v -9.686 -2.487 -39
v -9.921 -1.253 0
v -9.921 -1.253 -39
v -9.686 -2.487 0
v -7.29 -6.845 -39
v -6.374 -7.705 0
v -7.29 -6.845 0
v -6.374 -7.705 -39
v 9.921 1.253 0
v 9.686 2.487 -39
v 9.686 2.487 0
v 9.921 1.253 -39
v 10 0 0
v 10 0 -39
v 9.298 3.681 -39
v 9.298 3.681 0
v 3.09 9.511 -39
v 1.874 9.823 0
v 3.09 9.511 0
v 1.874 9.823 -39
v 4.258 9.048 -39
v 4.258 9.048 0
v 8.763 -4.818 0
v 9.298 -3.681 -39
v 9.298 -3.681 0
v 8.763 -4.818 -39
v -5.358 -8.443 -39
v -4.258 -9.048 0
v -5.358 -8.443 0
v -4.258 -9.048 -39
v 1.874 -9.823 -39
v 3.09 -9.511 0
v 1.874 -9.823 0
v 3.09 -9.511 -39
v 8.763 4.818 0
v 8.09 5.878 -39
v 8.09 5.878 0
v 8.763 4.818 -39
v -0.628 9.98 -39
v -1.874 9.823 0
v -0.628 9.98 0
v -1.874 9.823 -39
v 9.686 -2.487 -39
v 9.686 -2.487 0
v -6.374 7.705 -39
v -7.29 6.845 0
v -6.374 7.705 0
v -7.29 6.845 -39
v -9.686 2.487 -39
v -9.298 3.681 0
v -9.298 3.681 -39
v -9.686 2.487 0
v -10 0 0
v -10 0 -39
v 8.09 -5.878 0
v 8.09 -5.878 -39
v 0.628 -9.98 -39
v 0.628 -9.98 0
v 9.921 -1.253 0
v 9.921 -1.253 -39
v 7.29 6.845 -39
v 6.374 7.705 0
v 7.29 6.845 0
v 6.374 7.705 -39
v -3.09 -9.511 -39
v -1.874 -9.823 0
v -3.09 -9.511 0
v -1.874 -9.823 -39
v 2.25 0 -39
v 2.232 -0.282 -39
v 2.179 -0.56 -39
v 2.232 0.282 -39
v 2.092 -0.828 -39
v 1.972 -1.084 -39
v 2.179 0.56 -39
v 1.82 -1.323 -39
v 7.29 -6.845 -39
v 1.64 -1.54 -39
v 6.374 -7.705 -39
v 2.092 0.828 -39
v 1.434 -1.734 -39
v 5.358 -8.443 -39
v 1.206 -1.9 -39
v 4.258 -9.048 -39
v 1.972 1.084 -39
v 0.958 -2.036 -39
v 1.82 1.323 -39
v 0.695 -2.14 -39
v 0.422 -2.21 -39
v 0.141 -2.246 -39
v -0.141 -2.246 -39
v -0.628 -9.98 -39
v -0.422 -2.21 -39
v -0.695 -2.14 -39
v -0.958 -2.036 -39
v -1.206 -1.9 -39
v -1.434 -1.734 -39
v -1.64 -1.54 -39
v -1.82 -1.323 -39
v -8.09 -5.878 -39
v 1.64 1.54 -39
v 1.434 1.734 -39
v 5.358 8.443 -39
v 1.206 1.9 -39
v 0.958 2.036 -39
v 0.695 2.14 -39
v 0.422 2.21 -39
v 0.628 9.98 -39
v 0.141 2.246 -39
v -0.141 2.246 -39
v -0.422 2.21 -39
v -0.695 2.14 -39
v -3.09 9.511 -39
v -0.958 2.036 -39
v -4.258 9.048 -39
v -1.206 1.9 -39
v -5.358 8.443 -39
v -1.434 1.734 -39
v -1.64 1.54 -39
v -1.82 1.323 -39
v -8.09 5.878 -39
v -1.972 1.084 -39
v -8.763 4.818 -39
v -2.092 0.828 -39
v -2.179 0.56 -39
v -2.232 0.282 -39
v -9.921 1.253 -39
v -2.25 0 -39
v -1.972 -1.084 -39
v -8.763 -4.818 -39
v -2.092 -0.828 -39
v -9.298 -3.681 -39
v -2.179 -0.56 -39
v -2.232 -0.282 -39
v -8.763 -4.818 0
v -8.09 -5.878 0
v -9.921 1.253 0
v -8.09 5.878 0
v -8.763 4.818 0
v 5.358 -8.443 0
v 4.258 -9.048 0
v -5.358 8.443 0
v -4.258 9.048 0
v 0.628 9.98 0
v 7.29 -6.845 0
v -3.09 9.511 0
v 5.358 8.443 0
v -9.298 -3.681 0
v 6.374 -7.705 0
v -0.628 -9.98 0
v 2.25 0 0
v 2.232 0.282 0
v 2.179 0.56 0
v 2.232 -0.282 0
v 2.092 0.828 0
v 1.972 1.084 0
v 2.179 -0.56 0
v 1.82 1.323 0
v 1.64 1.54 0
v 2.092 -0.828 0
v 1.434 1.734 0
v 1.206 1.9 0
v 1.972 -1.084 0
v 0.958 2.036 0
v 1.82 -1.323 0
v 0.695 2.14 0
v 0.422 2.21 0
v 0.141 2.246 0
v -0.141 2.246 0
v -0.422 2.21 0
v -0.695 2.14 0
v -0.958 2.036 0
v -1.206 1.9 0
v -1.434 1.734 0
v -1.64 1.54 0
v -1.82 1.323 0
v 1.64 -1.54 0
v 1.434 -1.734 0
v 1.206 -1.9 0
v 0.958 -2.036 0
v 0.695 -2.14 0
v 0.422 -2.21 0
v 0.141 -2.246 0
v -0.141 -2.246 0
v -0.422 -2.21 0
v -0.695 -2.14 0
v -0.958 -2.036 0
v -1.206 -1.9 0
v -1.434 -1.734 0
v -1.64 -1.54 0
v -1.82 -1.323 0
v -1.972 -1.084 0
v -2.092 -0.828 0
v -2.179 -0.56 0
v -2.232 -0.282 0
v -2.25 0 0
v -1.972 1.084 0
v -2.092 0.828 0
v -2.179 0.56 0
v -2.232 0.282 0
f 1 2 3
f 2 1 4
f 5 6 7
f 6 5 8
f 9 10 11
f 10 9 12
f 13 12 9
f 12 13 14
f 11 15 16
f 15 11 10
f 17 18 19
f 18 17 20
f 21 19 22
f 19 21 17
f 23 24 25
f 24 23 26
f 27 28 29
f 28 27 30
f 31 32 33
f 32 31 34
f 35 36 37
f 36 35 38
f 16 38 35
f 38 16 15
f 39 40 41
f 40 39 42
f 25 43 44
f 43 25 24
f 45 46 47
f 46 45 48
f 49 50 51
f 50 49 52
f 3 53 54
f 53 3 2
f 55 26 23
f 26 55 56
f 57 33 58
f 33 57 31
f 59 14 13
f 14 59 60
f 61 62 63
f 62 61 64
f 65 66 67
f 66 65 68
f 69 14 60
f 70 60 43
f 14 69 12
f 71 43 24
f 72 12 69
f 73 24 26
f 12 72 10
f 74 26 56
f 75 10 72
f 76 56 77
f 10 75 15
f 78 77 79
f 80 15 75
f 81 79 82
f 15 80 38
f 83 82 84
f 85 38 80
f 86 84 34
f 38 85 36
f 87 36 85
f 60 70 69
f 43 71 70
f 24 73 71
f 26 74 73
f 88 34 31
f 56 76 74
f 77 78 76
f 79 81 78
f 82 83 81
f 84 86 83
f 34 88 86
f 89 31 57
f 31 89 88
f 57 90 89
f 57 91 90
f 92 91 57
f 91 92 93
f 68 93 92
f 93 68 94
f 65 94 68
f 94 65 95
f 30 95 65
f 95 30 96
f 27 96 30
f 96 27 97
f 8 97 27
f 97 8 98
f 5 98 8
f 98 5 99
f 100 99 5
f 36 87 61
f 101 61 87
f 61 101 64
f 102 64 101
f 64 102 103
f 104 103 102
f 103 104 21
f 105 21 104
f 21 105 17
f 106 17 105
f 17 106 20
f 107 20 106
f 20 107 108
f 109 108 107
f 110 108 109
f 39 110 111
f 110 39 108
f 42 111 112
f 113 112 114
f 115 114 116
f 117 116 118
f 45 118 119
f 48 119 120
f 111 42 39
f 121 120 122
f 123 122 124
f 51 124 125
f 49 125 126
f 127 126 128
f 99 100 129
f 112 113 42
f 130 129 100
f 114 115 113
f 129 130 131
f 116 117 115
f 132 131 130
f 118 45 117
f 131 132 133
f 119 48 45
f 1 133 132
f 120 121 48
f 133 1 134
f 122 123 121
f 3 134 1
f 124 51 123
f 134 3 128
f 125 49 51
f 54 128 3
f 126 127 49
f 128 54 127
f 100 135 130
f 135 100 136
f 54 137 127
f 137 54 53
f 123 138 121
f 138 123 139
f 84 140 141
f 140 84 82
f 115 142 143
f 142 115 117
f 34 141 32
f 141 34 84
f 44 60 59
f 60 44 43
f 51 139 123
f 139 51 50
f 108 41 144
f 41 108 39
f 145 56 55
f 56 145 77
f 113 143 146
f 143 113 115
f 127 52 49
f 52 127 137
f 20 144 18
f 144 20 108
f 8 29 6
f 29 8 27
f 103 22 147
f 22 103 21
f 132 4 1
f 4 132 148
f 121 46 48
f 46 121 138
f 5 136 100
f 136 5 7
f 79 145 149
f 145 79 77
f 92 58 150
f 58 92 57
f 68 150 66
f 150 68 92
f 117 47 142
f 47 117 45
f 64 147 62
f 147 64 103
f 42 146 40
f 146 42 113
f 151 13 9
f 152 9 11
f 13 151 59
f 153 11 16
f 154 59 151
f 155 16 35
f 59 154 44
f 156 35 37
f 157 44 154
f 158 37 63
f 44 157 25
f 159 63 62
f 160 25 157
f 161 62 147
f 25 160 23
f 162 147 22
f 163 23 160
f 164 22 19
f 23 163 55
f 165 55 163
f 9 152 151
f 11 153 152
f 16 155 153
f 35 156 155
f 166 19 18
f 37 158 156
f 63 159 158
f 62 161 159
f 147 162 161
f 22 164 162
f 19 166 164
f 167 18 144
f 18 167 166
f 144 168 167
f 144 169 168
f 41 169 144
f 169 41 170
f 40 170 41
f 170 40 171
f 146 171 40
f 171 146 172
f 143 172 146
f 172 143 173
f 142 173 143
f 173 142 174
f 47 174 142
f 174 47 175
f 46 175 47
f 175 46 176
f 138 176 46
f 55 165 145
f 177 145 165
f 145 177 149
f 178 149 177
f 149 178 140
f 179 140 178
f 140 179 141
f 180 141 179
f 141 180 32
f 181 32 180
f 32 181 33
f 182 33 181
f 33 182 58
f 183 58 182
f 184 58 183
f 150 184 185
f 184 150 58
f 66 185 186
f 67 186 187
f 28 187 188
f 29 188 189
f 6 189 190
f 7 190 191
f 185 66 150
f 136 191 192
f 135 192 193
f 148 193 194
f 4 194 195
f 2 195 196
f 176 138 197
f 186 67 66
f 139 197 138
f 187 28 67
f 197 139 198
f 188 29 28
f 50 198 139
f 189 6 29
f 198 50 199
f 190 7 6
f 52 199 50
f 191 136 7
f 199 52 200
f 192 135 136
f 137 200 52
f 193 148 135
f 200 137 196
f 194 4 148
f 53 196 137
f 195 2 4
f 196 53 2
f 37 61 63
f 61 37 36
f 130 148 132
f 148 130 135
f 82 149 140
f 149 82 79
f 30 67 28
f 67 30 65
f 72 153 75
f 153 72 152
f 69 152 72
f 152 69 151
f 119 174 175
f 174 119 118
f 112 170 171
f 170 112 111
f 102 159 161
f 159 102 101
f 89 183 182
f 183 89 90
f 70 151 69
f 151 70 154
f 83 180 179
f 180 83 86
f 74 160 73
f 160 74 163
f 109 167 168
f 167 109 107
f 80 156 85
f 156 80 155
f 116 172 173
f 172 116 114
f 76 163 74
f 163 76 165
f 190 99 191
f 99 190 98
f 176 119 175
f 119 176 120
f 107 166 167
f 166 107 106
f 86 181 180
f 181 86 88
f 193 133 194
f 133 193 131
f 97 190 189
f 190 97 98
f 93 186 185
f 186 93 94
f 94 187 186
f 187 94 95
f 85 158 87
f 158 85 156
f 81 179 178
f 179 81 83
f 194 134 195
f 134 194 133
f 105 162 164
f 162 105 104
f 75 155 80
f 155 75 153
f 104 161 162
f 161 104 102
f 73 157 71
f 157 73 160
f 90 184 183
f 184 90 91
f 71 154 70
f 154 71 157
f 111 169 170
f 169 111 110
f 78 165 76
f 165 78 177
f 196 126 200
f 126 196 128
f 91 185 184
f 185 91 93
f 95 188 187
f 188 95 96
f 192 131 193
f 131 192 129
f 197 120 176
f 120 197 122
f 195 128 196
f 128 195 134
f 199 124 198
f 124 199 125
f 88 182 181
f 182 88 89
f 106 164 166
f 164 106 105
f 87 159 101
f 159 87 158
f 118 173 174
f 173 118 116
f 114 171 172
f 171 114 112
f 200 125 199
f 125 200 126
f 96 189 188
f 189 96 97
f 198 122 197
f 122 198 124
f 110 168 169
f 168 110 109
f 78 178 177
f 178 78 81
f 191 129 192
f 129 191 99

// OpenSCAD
$fn = 50;


difference() {
	union() {
		translate(v = [0, 0, -39.0000000000]) {
			cylinder(h = 39, r = 10.0000000000);
		}
		cylinder(h = 0, r = 20.0000000000);
	}
	union() {
		#translate(v = [0, 0, -39]) {
			cylinder(h = 39, r = 2.2500000000);
		}
	}
}
